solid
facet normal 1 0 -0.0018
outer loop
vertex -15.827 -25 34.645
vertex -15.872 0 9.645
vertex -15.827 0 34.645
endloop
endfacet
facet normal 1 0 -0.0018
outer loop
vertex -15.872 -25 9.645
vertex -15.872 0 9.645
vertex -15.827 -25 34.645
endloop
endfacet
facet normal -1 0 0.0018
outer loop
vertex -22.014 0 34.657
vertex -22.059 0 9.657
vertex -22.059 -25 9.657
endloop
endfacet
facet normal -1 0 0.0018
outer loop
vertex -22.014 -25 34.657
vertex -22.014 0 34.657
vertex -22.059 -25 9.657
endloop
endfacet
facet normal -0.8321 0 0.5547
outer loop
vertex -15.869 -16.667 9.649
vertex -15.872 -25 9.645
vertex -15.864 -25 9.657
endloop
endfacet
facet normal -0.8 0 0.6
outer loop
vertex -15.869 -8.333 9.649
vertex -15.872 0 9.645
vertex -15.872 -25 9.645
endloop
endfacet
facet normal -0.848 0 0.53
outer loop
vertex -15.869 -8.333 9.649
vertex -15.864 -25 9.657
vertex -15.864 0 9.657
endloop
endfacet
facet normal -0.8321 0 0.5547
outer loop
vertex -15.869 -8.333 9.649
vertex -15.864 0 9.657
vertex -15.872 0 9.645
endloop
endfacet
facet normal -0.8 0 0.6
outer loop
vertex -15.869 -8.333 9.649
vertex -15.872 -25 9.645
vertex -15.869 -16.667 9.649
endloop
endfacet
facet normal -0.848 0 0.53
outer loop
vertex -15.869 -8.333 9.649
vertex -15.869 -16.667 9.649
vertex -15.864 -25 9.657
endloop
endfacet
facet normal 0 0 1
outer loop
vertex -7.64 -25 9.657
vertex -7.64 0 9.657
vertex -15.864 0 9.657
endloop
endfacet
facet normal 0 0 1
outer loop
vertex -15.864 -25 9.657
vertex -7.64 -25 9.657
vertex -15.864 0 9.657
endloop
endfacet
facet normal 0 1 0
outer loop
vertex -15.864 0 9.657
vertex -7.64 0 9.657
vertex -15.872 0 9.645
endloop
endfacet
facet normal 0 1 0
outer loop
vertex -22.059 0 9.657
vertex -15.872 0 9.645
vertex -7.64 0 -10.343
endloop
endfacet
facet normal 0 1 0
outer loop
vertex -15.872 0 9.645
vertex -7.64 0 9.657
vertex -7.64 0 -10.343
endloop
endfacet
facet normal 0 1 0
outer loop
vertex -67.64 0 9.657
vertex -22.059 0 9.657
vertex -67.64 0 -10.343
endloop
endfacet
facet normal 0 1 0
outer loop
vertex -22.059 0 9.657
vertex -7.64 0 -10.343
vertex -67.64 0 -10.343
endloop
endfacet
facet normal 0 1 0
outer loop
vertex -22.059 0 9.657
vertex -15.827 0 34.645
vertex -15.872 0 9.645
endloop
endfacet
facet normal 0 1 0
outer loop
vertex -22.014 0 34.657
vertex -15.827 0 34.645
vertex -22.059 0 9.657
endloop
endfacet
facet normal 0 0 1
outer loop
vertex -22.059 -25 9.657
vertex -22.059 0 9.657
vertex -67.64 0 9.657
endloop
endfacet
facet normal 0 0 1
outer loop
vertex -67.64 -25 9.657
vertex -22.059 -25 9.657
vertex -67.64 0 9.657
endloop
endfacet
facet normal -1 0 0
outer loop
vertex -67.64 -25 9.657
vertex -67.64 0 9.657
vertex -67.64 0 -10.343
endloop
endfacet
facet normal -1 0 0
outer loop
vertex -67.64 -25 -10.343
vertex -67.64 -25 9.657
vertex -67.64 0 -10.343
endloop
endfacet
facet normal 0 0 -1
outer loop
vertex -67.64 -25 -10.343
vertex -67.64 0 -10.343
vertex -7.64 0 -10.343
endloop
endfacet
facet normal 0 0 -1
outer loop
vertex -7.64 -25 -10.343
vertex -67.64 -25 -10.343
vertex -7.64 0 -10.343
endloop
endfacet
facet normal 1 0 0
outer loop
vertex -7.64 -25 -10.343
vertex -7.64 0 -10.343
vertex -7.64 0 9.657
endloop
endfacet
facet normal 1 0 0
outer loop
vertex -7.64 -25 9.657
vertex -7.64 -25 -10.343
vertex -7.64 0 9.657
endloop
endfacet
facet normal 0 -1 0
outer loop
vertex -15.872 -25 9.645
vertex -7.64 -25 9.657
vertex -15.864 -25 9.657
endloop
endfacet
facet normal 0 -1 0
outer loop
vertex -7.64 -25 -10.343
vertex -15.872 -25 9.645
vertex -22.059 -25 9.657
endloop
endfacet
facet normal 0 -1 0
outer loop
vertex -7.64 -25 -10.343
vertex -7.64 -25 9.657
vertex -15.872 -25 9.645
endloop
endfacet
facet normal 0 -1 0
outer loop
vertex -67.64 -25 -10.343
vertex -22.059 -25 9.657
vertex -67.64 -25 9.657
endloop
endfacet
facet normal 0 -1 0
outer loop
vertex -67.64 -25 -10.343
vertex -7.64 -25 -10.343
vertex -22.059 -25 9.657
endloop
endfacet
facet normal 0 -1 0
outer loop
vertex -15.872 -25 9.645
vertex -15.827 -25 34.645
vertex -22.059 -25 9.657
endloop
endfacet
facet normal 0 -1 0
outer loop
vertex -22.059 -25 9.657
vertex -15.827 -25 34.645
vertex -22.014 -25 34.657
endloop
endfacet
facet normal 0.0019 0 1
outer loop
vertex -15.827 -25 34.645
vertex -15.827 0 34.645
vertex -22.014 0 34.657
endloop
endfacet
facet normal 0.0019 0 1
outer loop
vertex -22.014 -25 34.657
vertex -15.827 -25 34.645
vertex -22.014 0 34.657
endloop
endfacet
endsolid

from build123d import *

# Parameters (mm, degrees)
F1_DEPTH = 25
F2_DEPTH = 25


# Not quite as in the source:
# - ends of sketch curves that miss each other by under 0.0002 mm in the source are joined
# - the dataset's text gives a spline's control points without its knots; the knots are read off the source's solid


with BuildPart() as f1:
    # F0 (on Front) → F1 (new body)
    with BuildSketch(Plane.XZ):
        with BuildLine():
            Line((-22.0594022245, 9.6566297112), (-67.6395371556, 9.6566297112))
            Line((-67.6395371556, 9.6566297112), (-67.6395371556, -10.3433702888))
            Line((-67.6395371556, -10.3433702888), (-7.6395371556, -10.3433702888))
            Line((-7.6395371556, -10.3433702888), (-7.6395371556, 9.6566297112))
            Line((-7.6395371556, 9.6566297112), (-15.8638085328, 9.6566297112))
            add(Edge.make_bspline(
                [(-15.872090736, 9.6453477446), (-15.8693299564, 9.6491085329), (-15.866569222, 9.6528691885), (-15.8638085328, 9.6566297112)],
                knots=[0.0211094133, 0.0211094133, 0.0211094133, 0.0211094133, 0.0211910509, 0.0211910509, 0.0211910509, 0.0211910509], degree=3))
            Line((-15.872090736, 9.6453477446), (-22.0594022245, 9.6566297112))
        make_face()
    extrude(amount=F1_DEPTH)

    # F2 (add): a face of the model
    f2_faces = [f1.faces().sort_by_distance(p)[0] for p in [
        (-18.9657464803, -12.5, 9.6509887279),
    ]]
    extrude(f2_faces, amount=F2_DEPTH)


solid = f1.part
